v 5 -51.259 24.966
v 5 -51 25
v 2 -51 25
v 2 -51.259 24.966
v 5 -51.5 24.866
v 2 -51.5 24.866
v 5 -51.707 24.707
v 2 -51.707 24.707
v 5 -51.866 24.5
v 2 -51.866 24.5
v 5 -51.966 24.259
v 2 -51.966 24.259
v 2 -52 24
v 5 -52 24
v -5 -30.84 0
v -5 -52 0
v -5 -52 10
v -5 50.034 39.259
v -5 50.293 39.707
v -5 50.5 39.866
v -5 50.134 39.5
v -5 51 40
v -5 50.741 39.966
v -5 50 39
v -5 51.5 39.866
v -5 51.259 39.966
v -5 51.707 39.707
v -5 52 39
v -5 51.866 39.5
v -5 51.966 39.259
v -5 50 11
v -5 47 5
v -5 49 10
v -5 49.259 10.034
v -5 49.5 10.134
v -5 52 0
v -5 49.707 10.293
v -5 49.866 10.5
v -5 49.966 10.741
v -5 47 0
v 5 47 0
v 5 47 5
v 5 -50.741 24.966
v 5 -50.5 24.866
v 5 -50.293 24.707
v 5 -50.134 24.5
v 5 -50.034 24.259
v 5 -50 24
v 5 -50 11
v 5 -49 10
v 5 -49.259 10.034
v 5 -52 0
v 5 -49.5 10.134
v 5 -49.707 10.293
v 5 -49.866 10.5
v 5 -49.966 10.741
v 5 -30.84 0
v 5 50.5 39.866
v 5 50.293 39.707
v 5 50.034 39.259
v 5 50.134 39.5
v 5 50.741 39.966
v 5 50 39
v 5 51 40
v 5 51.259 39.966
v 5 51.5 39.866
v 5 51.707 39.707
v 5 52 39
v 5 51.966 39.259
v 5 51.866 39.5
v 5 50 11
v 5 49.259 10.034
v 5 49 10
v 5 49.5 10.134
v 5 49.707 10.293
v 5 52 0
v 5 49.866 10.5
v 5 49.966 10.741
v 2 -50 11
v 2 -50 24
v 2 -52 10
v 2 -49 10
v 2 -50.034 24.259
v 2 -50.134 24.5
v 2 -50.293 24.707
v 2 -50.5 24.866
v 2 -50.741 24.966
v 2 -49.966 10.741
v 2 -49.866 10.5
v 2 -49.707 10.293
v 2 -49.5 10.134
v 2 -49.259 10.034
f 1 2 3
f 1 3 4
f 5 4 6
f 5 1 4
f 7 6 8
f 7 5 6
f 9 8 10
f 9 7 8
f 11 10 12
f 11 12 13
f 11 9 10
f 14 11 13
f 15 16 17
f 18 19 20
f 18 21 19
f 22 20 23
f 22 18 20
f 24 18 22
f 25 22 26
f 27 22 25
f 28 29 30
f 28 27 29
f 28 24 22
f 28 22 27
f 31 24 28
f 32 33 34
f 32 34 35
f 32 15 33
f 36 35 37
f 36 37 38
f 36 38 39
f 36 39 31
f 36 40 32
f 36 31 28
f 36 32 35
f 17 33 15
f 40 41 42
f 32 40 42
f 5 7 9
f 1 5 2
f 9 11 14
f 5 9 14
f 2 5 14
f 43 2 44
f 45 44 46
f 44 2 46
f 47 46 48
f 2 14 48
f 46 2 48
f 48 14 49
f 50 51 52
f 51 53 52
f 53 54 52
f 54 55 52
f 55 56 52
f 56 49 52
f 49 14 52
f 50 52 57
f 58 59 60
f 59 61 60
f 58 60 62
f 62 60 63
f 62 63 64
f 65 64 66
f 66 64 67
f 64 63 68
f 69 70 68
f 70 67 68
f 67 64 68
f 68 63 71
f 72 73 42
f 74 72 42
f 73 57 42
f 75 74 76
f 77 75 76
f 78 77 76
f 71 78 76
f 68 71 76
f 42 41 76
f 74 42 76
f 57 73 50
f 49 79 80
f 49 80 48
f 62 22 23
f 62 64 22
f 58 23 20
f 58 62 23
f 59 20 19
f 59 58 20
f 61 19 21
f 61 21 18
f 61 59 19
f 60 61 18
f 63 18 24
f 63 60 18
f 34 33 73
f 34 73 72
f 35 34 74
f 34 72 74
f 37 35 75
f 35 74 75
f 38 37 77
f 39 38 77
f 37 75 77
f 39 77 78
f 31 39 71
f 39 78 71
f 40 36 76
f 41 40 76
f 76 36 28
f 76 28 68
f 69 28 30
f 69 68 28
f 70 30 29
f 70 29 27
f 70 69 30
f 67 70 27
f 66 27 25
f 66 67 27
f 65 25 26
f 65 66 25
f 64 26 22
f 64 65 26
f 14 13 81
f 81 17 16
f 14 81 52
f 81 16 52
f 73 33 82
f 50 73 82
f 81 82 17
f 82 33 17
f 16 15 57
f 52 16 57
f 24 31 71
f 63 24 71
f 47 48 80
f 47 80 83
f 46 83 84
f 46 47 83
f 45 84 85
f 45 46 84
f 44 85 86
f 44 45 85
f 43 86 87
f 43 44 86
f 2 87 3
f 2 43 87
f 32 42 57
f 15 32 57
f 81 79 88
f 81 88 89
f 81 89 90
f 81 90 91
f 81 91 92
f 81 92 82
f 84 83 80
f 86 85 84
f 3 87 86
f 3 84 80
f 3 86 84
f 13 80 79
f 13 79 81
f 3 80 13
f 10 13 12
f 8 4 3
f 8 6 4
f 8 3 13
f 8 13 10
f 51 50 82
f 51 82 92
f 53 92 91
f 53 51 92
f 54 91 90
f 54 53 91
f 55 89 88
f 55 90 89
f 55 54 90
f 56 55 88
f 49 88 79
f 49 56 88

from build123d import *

# Parameters (mm, degrees)
F0_W      = 10
F0_H      = 104
F1_DEPTH  = 10
F2_W      = 10
F2_H      = 2
F3_DEPTH  = 15
F4_W      = 10
F4_H      = 2
F5_DEPTH  = 30
F7_DEPTH  = 10.001
F8_R      = 0.99999
F9_W      = 3
F9_H      = 15
F10_DEPTH = 7


# Not quite as in the source:
# - a fillet or chamfer is up to 0.001 mm smaller than in the source, because OpenCascade refuses the exact size


with BuildPart() as f1:
    # F0 (on Top) → F1 (new body)
    with BuildSketch(Plane.XY):
        Rectangle(F0_W, F0_H)
    extrude(amount=F1_DEPTH)

    # F2 (on face) → F3 (join)
    with BuildSketch(Plane.XY.offset(10)):
        with Locations((0, -51)):
            Rectangle(F2_W, F2_H)
    extrude(amount=F3_DEPTH)

    # F4 (on face) → F5 (join)
    with BuildSketch(Plane.XY.offset(10)):
        with Locations((0, 51)):
            Rectangle(F4_W, F4_H)
    extrude(amount=F5_DEPTH)

    # F6 (on face) → F7 (cut, through all)
    with BuildSketch(Plane.YZ.offset(5)):
        Polygon((47, 5), (-30.8395786217, 0), (47, 0), align=None)
    extrude(amount=-F7_DEPTH, mode=Mode.SUBTRACT)

    # F8 (radius 1 in the source; OpenCascade refuses exactly that, so slightly less here)
    f8_edges = [f1.edges().sort_by_distance(p)[0] for p in [
        (0, 50, 40),
        (0, 52, 40),
        (0, -52, 25),
        (0, -50, 25),
        (0, 50, 10),
        (0, -50, 10),
    ]]
    fillet(f8_edges, radius=F8_R)

    # F9 (on face) → F10 (cut)
    with BuildSketch(Plane(origin=(-5, 0, 0), x_dir=(0, -1, 0), z_dir=(-1, 0, 0))):
        with Locations((50.5, 17.5)):
            Rectangle(F9_W, F9_H)
    extrude(amount=-F10_DEPTH, mode=Mode.SUBTRACT)


solid = f1.part
